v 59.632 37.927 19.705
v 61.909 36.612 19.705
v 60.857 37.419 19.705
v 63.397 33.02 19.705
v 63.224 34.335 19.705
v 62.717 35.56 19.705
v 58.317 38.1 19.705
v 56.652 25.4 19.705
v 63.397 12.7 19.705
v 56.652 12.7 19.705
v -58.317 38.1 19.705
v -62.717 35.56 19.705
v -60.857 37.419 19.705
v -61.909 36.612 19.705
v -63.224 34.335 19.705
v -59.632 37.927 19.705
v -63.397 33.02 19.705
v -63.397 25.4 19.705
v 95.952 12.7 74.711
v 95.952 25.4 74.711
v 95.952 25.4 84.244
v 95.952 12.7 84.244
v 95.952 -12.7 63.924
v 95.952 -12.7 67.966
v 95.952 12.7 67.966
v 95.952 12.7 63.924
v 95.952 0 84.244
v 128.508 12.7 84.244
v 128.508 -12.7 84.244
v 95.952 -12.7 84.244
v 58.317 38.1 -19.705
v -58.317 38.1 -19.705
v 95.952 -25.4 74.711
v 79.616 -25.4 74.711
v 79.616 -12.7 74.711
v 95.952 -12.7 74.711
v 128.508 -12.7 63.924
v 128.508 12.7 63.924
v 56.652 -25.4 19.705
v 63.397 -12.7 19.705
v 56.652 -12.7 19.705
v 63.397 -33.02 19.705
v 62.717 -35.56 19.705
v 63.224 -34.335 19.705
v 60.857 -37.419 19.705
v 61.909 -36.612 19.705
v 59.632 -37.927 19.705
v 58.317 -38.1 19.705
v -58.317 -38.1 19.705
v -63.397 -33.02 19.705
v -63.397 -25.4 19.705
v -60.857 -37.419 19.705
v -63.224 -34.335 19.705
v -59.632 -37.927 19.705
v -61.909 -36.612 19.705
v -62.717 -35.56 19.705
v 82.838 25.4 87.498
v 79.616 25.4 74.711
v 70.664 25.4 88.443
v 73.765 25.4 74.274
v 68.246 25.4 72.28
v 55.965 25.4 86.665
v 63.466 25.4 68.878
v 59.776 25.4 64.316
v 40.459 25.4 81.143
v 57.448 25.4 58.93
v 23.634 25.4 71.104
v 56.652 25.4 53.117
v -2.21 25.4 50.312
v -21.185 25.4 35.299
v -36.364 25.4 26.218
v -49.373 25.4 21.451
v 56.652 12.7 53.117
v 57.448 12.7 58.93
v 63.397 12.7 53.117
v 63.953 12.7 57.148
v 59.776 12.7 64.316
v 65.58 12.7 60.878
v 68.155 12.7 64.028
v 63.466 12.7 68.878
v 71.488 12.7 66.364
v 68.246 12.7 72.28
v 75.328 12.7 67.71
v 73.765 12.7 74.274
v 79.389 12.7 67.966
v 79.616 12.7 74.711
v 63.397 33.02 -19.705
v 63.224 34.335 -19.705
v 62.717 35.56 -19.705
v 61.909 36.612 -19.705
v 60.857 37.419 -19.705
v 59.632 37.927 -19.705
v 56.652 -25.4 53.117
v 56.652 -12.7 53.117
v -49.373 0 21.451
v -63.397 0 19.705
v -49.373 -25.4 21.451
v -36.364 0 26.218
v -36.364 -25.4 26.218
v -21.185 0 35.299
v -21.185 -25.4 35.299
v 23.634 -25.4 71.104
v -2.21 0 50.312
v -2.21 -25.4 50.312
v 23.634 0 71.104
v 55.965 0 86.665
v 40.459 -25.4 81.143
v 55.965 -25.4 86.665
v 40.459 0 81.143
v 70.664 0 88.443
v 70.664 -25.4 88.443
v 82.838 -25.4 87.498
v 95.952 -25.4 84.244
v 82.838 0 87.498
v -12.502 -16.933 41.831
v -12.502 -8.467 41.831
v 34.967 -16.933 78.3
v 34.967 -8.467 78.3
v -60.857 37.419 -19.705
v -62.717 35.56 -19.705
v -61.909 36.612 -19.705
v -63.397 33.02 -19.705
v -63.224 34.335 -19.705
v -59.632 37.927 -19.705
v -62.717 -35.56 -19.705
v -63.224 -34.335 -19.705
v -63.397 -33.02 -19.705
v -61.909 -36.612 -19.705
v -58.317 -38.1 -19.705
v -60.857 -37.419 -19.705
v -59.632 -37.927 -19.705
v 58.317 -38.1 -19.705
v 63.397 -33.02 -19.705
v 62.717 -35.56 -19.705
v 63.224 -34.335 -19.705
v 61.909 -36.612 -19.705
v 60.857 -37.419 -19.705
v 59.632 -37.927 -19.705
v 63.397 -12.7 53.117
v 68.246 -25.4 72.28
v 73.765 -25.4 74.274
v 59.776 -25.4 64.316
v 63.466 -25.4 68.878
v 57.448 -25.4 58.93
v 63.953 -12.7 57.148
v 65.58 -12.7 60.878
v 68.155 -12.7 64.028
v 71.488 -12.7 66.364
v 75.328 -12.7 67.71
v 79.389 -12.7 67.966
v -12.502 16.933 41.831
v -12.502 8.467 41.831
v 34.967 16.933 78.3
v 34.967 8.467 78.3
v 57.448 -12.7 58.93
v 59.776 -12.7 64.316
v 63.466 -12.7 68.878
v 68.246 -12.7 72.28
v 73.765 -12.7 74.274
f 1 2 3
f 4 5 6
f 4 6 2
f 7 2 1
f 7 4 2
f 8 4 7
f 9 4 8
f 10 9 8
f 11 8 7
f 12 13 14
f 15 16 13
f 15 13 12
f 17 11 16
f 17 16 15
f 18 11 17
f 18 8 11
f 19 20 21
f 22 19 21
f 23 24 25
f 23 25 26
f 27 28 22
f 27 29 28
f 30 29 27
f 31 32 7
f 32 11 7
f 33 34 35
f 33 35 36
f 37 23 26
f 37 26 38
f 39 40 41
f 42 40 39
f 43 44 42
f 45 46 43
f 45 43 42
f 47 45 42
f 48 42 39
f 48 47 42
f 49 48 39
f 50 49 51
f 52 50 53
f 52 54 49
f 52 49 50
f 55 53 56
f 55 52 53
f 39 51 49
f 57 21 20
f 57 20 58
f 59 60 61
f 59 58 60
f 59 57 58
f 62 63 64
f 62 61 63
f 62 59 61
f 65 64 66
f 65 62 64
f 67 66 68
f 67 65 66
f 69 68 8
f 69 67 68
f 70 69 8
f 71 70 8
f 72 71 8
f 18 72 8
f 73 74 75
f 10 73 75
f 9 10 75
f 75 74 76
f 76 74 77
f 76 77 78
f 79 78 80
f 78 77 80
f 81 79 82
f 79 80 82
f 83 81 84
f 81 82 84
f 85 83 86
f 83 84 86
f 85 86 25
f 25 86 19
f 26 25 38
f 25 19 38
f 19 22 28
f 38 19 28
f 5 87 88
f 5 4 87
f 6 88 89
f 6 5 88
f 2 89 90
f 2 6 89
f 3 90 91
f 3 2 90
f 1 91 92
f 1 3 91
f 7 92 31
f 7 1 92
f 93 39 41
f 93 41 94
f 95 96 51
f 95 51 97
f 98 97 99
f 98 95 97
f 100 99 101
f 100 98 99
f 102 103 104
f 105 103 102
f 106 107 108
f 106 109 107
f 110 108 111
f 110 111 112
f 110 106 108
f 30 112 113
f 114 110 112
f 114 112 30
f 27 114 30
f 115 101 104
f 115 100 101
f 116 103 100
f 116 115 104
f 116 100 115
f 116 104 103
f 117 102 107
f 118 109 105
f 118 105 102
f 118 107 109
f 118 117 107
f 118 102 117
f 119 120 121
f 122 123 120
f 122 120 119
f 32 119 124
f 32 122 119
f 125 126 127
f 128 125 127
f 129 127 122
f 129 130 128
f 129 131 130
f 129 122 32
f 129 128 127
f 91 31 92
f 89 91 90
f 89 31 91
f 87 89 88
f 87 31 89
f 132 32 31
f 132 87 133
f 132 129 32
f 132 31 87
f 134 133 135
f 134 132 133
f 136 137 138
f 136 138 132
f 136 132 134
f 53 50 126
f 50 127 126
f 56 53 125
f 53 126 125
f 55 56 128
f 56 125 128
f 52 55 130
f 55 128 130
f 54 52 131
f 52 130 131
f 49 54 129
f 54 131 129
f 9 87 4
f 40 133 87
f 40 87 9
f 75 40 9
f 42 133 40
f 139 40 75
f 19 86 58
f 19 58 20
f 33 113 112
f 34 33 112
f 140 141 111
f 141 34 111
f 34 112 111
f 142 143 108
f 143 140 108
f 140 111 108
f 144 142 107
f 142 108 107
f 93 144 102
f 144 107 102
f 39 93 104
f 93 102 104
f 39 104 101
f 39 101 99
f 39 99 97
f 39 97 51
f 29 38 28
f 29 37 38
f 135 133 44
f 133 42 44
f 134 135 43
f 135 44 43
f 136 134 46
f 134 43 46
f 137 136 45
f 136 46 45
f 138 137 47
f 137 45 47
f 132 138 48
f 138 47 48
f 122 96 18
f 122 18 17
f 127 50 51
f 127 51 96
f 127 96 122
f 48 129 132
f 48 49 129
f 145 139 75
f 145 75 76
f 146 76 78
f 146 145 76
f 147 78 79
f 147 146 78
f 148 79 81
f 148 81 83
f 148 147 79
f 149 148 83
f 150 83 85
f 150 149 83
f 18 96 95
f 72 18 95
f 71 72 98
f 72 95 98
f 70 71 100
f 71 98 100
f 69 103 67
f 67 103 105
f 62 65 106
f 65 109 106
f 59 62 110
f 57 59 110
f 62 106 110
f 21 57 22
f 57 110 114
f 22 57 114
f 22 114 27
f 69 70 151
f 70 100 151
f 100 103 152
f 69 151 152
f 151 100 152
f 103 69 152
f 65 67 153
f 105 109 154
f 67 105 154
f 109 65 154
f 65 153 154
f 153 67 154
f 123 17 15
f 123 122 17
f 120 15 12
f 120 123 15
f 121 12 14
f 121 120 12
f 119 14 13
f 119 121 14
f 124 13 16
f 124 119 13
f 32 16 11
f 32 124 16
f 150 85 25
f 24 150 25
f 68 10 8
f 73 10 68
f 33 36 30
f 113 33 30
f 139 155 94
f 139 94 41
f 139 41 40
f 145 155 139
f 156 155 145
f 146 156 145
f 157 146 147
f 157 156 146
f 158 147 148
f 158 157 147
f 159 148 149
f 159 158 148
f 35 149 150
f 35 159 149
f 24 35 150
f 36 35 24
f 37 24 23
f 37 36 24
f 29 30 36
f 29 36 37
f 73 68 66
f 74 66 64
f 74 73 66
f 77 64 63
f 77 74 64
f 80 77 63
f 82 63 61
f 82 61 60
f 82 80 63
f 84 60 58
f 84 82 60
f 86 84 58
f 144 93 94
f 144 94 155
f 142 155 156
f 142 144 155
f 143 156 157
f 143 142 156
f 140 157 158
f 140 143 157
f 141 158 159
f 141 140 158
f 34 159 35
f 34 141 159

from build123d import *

# Parameters (mm, degrees)
F1_DEPTH = 38.1
F2_DEPTH = 25.4
F3_DEPTH = 12.7
F4_DEPTH = 12.7
F5_R     = 5.08


with BuildPart() as f1:
    # F0 (on Front) → F1 (new body, symmetric)
    with BuildSketch(Plane.XZ):
        Polygon((-63.397139, 19.704513), (-63.397139, -19.704513), (63.397139, -19.704513), (63.397139, 19.704513), (56.652256, 19.704513), align=None)
    extrude(amount=F1_DEPTH, both=True)

    # F0 (on Front) → F2 (join, symmetric)
    with BuildSketch(Plane.XZ):
        with BuildLine():
            add(Edge.make_bspline(
                [(-63.397139, 19.704513), (-5.140318, 19.704513), (22.56023, 108.517617), (95.952414, 84.243942)],
                knots=[0, 0, 0, 0, 171.923291, 171.923291, 171.923291, 171.923291], degree=3))
            Line((-63.397139, 19.704513), (56.652256, 19.704513))
            Line((56.652256, 19.704513), (56.652256, 53.116519))
            ThreePointArc((56.652256, 53.116519), (63.466087, 68.877623), (79.615708, 74.711181))
            Line((79.615708, 74.711181), (95.952414, 74.711181))
            Line((95.952414, 74.711181), (95.952414, 84.243942))
        make_face()
    extrude(amount=F2_DEPTH, both=True)

    # F0 (on Front) → F3 (join, symmetric)
    with BuildSketch(Plane.XZ):
        with BuildLine():
            Line((56.652256, 19.704513), (63.397139, 19.704513))
            Line((63.397139, 19.704513), (63.397139, 53.116519))
            ThreePointArc((63.397139, 53.116519), (68.1554, 64.028229), (79.389192, 67.966297))
            Line((79.389192, 67.966297), (95.952414, 67.966297))
            Line((95.952414, 67.966297), (95.952414, 74.711181))
            Line((95.952414, 74.711181), (79.615708, 74.711181))
            ThreePointArc((79.615708, 74.711181), (63.466087, 68.877623), (56.652256, 53.116519))
            Line((56.652256, 53.116519), (56.652256, 19.704513))
        make_face()
    extrude(amount=F3_DEPTH, both=True)

    # F0 (on Front) → F4 (join, symmetric)
    with BuildSketch(Plane.XZ):
        Polygon((128.507696, 84.243942), (95.952414, 84.243942), (95.952414, 74.711181), (95.952414, 67.966297), (95.952414, 63.923942), (128.507696, 63.923942), align=None)
    extrude(amount=F4_DEPTH, both=True)

    # F5
    f5_edges = [f1.edges().sort_by_distance(p)[0] for p in [
        (-63.397139, -38.1, 0),
        (63.397139, -38.1, 0),
        (63.397139, 38.1, 0),
        (-63.397139, 38.1, 0),
    ]]
    fillet(f5_edges, radius=F5_R)


solid = f1.part
